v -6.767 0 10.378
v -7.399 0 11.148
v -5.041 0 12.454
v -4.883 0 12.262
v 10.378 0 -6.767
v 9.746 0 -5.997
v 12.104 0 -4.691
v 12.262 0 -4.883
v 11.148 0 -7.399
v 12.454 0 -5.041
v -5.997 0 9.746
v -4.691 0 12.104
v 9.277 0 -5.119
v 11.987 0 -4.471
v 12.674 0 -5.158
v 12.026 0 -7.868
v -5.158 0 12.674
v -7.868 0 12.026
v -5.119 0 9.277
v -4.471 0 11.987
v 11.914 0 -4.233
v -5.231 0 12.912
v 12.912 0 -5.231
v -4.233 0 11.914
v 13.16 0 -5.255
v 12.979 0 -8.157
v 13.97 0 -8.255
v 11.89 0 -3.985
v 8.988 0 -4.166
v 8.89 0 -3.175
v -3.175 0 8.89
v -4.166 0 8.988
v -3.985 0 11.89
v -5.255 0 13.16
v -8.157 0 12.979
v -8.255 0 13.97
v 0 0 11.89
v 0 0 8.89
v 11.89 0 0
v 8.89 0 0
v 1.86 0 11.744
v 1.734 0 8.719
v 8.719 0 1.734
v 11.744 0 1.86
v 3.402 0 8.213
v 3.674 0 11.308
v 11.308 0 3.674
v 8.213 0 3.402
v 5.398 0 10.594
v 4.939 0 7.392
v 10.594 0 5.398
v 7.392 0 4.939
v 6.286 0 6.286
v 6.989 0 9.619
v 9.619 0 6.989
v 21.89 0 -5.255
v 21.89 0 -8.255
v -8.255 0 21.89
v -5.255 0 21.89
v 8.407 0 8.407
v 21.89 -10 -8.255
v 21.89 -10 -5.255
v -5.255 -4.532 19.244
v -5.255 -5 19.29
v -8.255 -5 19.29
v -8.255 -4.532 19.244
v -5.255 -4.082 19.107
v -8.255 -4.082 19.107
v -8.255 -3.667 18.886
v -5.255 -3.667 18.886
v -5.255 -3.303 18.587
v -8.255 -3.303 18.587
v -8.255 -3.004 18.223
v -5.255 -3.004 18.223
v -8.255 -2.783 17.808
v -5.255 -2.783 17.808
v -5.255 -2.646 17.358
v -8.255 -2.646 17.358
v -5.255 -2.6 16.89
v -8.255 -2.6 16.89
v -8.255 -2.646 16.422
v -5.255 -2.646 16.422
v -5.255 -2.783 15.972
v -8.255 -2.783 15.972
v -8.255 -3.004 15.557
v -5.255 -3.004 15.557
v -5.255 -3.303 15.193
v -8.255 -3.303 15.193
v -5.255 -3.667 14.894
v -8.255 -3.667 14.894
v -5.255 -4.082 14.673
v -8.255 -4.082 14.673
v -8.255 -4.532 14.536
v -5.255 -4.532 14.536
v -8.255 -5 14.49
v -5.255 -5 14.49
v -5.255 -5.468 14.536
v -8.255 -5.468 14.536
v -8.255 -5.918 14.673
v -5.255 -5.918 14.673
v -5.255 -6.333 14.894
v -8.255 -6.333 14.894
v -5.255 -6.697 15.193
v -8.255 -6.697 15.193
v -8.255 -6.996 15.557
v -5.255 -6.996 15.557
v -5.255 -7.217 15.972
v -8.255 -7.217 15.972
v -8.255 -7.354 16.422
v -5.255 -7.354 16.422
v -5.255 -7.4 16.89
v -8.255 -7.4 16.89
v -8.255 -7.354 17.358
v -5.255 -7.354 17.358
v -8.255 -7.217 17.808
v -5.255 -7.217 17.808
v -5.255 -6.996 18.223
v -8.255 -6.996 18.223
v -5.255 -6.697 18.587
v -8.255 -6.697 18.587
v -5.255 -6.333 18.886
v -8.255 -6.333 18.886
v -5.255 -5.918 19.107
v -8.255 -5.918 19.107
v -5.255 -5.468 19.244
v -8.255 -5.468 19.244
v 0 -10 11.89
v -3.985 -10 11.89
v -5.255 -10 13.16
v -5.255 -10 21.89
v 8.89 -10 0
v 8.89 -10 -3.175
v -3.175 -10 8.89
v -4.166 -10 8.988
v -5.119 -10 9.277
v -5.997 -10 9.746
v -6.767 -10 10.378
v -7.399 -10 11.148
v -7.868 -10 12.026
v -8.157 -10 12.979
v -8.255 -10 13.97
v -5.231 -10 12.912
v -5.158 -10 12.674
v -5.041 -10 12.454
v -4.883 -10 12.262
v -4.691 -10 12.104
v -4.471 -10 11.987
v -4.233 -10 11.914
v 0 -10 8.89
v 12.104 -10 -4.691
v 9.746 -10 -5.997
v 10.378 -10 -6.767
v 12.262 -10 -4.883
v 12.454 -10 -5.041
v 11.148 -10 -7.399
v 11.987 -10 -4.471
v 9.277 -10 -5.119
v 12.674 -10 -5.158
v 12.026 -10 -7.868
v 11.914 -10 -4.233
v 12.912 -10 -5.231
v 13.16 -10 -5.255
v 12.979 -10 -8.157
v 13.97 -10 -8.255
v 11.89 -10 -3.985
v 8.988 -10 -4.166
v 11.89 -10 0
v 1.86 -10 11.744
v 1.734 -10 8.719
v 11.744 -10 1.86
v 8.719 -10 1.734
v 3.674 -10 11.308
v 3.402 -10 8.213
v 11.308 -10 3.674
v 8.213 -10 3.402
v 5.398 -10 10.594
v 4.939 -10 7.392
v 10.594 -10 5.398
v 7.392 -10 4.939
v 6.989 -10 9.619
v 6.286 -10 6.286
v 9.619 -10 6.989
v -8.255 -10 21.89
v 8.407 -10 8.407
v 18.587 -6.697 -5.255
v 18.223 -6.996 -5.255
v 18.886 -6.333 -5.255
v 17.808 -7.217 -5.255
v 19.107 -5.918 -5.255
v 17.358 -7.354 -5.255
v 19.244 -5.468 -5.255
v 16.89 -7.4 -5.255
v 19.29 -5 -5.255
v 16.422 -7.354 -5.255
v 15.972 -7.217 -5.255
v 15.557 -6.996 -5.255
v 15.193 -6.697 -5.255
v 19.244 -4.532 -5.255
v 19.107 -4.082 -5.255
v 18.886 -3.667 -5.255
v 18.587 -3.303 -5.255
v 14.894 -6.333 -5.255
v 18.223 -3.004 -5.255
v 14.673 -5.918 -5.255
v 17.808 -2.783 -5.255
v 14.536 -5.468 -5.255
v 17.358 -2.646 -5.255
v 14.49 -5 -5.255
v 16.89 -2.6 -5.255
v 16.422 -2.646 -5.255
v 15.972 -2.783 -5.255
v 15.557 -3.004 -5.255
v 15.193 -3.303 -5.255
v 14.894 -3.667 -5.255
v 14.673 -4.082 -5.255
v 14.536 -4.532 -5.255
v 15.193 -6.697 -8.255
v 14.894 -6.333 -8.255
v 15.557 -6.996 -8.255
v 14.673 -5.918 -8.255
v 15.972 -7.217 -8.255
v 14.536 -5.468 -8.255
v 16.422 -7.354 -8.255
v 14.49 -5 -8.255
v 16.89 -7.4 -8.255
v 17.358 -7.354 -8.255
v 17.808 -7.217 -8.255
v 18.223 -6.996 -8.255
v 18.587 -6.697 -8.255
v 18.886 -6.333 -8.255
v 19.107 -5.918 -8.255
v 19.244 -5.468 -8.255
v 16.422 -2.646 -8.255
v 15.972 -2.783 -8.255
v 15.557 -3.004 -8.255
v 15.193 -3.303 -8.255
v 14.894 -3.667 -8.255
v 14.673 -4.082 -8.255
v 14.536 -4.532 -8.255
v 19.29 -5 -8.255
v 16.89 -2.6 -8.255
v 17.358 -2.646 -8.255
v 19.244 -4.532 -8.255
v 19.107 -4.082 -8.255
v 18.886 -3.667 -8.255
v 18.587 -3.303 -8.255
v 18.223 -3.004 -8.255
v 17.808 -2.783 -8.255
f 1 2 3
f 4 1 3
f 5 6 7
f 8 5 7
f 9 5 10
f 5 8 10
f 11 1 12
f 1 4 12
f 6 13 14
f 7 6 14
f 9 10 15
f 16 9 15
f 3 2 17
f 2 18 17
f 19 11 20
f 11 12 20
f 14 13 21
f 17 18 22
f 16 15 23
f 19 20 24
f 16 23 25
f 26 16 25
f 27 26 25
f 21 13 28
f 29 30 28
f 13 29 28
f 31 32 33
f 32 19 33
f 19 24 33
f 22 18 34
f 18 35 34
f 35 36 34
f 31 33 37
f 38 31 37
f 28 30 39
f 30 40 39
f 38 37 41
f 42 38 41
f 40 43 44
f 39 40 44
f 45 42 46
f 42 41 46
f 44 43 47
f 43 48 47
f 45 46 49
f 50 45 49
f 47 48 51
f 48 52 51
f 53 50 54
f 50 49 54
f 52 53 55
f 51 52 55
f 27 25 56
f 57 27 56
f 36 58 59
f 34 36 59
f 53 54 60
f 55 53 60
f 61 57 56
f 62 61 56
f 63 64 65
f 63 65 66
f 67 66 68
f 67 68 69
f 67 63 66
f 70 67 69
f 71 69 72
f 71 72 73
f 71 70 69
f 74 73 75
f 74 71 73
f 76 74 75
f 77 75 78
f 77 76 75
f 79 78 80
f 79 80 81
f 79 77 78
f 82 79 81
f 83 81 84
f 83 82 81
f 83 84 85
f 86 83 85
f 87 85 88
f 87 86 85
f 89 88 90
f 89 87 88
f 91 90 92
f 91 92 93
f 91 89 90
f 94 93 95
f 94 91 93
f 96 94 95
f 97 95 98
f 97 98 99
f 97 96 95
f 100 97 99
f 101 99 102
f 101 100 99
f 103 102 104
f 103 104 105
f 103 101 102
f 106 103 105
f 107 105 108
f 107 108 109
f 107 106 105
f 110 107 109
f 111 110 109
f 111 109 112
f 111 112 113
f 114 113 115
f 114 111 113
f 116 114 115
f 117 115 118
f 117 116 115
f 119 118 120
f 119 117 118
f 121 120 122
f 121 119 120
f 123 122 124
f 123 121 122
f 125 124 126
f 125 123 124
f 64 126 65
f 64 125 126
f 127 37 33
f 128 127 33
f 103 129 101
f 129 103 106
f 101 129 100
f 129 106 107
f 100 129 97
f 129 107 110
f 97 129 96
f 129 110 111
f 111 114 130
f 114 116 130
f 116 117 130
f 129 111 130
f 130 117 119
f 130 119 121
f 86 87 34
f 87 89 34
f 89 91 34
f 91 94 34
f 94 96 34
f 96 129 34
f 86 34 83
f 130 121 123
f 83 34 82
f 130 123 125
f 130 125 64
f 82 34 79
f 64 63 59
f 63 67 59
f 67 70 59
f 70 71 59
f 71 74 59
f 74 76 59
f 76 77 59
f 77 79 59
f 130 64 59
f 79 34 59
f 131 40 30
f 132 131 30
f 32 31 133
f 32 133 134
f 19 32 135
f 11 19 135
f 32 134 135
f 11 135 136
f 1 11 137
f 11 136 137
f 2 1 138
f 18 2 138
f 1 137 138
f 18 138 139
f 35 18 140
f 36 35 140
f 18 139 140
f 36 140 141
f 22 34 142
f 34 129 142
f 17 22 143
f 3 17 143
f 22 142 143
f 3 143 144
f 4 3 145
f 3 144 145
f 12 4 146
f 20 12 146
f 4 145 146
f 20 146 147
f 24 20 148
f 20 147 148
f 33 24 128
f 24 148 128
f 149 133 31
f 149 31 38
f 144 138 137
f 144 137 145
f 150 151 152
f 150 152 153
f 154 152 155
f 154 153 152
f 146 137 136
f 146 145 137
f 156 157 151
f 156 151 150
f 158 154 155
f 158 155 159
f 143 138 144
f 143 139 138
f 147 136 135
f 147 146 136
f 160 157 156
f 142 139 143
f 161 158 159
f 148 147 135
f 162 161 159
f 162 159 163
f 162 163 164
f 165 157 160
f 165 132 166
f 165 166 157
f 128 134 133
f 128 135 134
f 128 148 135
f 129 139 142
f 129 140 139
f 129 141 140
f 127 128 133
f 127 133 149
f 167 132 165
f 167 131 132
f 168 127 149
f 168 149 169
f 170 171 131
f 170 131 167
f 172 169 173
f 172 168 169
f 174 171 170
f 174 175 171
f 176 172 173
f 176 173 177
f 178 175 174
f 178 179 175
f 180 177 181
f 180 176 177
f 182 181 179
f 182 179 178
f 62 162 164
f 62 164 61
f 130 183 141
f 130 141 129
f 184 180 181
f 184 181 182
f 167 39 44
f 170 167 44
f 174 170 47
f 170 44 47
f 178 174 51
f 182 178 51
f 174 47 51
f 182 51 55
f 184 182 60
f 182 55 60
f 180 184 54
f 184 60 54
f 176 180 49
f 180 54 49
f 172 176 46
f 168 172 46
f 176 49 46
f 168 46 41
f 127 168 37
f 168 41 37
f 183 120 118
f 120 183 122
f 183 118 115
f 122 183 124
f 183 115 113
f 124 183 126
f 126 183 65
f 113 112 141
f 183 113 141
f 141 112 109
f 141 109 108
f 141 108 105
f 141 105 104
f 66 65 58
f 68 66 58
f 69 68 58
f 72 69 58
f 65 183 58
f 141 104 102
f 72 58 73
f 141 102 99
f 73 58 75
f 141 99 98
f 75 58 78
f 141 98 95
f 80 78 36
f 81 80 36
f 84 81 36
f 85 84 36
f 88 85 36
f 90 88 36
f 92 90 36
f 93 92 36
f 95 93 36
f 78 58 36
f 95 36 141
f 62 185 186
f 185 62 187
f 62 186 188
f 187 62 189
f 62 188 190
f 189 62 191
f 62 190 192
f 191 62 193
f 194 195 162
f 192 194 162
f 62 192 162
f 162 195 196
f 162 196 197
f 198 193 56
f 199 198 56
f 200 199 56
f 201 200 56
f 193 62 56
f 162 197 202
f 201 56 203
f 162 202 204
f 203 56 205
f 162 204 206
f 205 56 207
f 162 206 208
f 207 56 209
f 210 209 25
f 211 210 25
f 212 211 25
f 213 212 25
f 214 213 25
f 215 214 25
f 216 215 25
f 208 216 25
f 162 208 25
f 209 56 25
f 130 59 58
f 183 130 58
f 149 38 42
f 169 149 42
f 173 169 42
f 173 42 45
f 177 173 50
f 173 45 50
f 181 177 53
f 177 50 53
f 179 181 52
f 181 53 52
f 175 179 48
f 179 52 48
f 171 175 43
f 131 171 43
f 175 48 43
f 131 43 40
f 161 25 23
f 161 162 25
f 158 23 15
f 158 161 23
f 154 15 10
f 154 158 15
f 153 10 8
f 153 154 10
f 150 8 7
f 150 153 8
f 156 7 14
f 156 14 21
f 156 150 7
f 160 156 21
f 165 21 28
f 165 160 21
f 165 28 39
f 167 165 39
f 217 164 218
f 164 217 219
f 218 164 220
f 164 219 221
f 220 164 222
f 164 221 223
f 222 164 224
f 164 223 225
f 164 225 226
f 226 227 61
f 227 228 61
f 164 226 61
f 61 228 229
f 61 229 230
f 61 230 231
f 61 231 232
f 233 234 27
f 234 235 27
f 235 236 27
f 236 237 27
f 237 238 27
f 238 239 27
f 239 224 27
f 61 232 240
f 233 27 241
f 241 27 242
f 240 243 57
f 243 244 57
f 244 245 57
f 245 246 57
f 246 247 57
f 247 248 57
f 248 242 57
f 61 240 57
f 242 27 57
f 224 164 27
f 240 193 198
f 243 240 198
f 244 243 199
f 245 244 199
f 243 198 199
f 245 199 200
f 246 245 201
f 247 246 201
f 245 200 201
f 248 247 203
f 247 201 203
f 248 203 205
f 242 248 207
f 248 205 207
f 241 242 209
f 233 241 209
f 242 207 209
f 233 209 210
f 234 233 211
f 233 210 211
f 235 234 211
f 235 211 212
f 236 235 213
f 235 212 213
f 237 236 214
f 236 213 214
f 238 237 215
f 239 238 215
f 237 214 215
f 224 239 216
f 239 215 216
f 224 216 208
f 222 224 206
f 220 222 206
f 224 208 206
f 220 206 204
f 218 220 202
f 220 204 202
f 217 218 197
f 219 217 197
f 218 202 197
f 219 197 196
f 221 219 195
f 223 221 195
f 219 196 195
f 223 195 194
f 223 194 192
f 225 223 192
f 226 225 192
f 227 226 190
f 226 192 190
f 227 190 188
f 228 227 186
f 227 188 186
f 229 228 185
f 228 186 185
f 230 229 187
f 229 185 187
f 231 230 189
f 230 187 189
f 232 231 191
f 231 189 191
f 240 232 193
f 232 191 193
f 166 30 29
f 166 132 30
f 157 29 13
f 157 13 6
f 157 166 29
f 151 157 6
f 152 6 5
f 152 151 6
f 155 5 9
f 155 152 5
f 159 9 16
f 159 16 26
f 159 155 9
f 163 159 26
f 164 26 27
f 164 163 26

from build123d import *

# Parameters (mm, degrees)
F1_DEPTH = 10
F2_R     = 2.4
F3_DEPTH = 3
F7_R     = 5.08
F8_R     = 1.27


# Not quite as in the source:
# - a pattern or mirror of a feature is missing from the dataset's text; its kind, count and spacing are read off the source's solid


with BuildPart() as f1:
    # F0 (on Front) → F1 (new body)
    with BuildSketch(Plane.XZ):
        with BuildLine():
            ThreePointArc((0, 8.89), (6.2861792847, 6.2861792847), (8.89, 0))
            Line((8.89, 0), (8.89, -8.255))
            Line((8.89, -8.255), (21.89, -8.255))
            Line((21.89, -8.255), (21.89, -5.255))
            Line((21.89, -5.255), (11.89, -5.255))
            Line((11.89, -5.255), (11.89, 0))
            ThreePointArc((11.89, 0), (8.4074996283, 8.4074996283), (0, 11.89))
            Line((0, 11.89), (-5.255, 11.89))
            Line((-5.255, 11.89), (-5.255, 21.89))
            Line((-5.255, 21.89), (-8.255, 21.89))
            Line((-8.255, 21.89), (-8.255, 8.89))
            Line((-8.255, 8.89), (0, 8.89))
        make_face()
    extrude(amount=F1_DEPTH)

    # F2 (on face) → F3 (cut, through all)
    with BuildSketch(Plane.XY.offset(-5.255)):
        with Locations((16.89, -5)):
            Circle(F2_R)
    f3 = extrude(amount=-F3_DEPTH, mode=Mode.SUBTRACT)

    # F3_copies: F3 across plane
    add(f3.mirror(Plane(origin=(0, 0, 0), x_dir=(-0.7071067812, 0, -0.7071067812), z_dir=(-0.7071067812, 0, 0.7071067812))), mode=Mode.SUBTRACT)

    # F7
    f7_edges = [f1.edges().sort_by_distance(p)[0] for p in [
        (-8.255, -5, 8.89),
        (8.89, -5, -8.255),
    ]]
    fillet(f7_edges, radius=F7_R)

    # F8
    f8_edges = [f1.edges().sort_by_distance(p)[0] for p in [
        (-5.255, -5, 11.89),
        (11.89, -5, -5.255),
    ]]
    fillet(f8_edges, radius=F8_R)


solid = f1.part
